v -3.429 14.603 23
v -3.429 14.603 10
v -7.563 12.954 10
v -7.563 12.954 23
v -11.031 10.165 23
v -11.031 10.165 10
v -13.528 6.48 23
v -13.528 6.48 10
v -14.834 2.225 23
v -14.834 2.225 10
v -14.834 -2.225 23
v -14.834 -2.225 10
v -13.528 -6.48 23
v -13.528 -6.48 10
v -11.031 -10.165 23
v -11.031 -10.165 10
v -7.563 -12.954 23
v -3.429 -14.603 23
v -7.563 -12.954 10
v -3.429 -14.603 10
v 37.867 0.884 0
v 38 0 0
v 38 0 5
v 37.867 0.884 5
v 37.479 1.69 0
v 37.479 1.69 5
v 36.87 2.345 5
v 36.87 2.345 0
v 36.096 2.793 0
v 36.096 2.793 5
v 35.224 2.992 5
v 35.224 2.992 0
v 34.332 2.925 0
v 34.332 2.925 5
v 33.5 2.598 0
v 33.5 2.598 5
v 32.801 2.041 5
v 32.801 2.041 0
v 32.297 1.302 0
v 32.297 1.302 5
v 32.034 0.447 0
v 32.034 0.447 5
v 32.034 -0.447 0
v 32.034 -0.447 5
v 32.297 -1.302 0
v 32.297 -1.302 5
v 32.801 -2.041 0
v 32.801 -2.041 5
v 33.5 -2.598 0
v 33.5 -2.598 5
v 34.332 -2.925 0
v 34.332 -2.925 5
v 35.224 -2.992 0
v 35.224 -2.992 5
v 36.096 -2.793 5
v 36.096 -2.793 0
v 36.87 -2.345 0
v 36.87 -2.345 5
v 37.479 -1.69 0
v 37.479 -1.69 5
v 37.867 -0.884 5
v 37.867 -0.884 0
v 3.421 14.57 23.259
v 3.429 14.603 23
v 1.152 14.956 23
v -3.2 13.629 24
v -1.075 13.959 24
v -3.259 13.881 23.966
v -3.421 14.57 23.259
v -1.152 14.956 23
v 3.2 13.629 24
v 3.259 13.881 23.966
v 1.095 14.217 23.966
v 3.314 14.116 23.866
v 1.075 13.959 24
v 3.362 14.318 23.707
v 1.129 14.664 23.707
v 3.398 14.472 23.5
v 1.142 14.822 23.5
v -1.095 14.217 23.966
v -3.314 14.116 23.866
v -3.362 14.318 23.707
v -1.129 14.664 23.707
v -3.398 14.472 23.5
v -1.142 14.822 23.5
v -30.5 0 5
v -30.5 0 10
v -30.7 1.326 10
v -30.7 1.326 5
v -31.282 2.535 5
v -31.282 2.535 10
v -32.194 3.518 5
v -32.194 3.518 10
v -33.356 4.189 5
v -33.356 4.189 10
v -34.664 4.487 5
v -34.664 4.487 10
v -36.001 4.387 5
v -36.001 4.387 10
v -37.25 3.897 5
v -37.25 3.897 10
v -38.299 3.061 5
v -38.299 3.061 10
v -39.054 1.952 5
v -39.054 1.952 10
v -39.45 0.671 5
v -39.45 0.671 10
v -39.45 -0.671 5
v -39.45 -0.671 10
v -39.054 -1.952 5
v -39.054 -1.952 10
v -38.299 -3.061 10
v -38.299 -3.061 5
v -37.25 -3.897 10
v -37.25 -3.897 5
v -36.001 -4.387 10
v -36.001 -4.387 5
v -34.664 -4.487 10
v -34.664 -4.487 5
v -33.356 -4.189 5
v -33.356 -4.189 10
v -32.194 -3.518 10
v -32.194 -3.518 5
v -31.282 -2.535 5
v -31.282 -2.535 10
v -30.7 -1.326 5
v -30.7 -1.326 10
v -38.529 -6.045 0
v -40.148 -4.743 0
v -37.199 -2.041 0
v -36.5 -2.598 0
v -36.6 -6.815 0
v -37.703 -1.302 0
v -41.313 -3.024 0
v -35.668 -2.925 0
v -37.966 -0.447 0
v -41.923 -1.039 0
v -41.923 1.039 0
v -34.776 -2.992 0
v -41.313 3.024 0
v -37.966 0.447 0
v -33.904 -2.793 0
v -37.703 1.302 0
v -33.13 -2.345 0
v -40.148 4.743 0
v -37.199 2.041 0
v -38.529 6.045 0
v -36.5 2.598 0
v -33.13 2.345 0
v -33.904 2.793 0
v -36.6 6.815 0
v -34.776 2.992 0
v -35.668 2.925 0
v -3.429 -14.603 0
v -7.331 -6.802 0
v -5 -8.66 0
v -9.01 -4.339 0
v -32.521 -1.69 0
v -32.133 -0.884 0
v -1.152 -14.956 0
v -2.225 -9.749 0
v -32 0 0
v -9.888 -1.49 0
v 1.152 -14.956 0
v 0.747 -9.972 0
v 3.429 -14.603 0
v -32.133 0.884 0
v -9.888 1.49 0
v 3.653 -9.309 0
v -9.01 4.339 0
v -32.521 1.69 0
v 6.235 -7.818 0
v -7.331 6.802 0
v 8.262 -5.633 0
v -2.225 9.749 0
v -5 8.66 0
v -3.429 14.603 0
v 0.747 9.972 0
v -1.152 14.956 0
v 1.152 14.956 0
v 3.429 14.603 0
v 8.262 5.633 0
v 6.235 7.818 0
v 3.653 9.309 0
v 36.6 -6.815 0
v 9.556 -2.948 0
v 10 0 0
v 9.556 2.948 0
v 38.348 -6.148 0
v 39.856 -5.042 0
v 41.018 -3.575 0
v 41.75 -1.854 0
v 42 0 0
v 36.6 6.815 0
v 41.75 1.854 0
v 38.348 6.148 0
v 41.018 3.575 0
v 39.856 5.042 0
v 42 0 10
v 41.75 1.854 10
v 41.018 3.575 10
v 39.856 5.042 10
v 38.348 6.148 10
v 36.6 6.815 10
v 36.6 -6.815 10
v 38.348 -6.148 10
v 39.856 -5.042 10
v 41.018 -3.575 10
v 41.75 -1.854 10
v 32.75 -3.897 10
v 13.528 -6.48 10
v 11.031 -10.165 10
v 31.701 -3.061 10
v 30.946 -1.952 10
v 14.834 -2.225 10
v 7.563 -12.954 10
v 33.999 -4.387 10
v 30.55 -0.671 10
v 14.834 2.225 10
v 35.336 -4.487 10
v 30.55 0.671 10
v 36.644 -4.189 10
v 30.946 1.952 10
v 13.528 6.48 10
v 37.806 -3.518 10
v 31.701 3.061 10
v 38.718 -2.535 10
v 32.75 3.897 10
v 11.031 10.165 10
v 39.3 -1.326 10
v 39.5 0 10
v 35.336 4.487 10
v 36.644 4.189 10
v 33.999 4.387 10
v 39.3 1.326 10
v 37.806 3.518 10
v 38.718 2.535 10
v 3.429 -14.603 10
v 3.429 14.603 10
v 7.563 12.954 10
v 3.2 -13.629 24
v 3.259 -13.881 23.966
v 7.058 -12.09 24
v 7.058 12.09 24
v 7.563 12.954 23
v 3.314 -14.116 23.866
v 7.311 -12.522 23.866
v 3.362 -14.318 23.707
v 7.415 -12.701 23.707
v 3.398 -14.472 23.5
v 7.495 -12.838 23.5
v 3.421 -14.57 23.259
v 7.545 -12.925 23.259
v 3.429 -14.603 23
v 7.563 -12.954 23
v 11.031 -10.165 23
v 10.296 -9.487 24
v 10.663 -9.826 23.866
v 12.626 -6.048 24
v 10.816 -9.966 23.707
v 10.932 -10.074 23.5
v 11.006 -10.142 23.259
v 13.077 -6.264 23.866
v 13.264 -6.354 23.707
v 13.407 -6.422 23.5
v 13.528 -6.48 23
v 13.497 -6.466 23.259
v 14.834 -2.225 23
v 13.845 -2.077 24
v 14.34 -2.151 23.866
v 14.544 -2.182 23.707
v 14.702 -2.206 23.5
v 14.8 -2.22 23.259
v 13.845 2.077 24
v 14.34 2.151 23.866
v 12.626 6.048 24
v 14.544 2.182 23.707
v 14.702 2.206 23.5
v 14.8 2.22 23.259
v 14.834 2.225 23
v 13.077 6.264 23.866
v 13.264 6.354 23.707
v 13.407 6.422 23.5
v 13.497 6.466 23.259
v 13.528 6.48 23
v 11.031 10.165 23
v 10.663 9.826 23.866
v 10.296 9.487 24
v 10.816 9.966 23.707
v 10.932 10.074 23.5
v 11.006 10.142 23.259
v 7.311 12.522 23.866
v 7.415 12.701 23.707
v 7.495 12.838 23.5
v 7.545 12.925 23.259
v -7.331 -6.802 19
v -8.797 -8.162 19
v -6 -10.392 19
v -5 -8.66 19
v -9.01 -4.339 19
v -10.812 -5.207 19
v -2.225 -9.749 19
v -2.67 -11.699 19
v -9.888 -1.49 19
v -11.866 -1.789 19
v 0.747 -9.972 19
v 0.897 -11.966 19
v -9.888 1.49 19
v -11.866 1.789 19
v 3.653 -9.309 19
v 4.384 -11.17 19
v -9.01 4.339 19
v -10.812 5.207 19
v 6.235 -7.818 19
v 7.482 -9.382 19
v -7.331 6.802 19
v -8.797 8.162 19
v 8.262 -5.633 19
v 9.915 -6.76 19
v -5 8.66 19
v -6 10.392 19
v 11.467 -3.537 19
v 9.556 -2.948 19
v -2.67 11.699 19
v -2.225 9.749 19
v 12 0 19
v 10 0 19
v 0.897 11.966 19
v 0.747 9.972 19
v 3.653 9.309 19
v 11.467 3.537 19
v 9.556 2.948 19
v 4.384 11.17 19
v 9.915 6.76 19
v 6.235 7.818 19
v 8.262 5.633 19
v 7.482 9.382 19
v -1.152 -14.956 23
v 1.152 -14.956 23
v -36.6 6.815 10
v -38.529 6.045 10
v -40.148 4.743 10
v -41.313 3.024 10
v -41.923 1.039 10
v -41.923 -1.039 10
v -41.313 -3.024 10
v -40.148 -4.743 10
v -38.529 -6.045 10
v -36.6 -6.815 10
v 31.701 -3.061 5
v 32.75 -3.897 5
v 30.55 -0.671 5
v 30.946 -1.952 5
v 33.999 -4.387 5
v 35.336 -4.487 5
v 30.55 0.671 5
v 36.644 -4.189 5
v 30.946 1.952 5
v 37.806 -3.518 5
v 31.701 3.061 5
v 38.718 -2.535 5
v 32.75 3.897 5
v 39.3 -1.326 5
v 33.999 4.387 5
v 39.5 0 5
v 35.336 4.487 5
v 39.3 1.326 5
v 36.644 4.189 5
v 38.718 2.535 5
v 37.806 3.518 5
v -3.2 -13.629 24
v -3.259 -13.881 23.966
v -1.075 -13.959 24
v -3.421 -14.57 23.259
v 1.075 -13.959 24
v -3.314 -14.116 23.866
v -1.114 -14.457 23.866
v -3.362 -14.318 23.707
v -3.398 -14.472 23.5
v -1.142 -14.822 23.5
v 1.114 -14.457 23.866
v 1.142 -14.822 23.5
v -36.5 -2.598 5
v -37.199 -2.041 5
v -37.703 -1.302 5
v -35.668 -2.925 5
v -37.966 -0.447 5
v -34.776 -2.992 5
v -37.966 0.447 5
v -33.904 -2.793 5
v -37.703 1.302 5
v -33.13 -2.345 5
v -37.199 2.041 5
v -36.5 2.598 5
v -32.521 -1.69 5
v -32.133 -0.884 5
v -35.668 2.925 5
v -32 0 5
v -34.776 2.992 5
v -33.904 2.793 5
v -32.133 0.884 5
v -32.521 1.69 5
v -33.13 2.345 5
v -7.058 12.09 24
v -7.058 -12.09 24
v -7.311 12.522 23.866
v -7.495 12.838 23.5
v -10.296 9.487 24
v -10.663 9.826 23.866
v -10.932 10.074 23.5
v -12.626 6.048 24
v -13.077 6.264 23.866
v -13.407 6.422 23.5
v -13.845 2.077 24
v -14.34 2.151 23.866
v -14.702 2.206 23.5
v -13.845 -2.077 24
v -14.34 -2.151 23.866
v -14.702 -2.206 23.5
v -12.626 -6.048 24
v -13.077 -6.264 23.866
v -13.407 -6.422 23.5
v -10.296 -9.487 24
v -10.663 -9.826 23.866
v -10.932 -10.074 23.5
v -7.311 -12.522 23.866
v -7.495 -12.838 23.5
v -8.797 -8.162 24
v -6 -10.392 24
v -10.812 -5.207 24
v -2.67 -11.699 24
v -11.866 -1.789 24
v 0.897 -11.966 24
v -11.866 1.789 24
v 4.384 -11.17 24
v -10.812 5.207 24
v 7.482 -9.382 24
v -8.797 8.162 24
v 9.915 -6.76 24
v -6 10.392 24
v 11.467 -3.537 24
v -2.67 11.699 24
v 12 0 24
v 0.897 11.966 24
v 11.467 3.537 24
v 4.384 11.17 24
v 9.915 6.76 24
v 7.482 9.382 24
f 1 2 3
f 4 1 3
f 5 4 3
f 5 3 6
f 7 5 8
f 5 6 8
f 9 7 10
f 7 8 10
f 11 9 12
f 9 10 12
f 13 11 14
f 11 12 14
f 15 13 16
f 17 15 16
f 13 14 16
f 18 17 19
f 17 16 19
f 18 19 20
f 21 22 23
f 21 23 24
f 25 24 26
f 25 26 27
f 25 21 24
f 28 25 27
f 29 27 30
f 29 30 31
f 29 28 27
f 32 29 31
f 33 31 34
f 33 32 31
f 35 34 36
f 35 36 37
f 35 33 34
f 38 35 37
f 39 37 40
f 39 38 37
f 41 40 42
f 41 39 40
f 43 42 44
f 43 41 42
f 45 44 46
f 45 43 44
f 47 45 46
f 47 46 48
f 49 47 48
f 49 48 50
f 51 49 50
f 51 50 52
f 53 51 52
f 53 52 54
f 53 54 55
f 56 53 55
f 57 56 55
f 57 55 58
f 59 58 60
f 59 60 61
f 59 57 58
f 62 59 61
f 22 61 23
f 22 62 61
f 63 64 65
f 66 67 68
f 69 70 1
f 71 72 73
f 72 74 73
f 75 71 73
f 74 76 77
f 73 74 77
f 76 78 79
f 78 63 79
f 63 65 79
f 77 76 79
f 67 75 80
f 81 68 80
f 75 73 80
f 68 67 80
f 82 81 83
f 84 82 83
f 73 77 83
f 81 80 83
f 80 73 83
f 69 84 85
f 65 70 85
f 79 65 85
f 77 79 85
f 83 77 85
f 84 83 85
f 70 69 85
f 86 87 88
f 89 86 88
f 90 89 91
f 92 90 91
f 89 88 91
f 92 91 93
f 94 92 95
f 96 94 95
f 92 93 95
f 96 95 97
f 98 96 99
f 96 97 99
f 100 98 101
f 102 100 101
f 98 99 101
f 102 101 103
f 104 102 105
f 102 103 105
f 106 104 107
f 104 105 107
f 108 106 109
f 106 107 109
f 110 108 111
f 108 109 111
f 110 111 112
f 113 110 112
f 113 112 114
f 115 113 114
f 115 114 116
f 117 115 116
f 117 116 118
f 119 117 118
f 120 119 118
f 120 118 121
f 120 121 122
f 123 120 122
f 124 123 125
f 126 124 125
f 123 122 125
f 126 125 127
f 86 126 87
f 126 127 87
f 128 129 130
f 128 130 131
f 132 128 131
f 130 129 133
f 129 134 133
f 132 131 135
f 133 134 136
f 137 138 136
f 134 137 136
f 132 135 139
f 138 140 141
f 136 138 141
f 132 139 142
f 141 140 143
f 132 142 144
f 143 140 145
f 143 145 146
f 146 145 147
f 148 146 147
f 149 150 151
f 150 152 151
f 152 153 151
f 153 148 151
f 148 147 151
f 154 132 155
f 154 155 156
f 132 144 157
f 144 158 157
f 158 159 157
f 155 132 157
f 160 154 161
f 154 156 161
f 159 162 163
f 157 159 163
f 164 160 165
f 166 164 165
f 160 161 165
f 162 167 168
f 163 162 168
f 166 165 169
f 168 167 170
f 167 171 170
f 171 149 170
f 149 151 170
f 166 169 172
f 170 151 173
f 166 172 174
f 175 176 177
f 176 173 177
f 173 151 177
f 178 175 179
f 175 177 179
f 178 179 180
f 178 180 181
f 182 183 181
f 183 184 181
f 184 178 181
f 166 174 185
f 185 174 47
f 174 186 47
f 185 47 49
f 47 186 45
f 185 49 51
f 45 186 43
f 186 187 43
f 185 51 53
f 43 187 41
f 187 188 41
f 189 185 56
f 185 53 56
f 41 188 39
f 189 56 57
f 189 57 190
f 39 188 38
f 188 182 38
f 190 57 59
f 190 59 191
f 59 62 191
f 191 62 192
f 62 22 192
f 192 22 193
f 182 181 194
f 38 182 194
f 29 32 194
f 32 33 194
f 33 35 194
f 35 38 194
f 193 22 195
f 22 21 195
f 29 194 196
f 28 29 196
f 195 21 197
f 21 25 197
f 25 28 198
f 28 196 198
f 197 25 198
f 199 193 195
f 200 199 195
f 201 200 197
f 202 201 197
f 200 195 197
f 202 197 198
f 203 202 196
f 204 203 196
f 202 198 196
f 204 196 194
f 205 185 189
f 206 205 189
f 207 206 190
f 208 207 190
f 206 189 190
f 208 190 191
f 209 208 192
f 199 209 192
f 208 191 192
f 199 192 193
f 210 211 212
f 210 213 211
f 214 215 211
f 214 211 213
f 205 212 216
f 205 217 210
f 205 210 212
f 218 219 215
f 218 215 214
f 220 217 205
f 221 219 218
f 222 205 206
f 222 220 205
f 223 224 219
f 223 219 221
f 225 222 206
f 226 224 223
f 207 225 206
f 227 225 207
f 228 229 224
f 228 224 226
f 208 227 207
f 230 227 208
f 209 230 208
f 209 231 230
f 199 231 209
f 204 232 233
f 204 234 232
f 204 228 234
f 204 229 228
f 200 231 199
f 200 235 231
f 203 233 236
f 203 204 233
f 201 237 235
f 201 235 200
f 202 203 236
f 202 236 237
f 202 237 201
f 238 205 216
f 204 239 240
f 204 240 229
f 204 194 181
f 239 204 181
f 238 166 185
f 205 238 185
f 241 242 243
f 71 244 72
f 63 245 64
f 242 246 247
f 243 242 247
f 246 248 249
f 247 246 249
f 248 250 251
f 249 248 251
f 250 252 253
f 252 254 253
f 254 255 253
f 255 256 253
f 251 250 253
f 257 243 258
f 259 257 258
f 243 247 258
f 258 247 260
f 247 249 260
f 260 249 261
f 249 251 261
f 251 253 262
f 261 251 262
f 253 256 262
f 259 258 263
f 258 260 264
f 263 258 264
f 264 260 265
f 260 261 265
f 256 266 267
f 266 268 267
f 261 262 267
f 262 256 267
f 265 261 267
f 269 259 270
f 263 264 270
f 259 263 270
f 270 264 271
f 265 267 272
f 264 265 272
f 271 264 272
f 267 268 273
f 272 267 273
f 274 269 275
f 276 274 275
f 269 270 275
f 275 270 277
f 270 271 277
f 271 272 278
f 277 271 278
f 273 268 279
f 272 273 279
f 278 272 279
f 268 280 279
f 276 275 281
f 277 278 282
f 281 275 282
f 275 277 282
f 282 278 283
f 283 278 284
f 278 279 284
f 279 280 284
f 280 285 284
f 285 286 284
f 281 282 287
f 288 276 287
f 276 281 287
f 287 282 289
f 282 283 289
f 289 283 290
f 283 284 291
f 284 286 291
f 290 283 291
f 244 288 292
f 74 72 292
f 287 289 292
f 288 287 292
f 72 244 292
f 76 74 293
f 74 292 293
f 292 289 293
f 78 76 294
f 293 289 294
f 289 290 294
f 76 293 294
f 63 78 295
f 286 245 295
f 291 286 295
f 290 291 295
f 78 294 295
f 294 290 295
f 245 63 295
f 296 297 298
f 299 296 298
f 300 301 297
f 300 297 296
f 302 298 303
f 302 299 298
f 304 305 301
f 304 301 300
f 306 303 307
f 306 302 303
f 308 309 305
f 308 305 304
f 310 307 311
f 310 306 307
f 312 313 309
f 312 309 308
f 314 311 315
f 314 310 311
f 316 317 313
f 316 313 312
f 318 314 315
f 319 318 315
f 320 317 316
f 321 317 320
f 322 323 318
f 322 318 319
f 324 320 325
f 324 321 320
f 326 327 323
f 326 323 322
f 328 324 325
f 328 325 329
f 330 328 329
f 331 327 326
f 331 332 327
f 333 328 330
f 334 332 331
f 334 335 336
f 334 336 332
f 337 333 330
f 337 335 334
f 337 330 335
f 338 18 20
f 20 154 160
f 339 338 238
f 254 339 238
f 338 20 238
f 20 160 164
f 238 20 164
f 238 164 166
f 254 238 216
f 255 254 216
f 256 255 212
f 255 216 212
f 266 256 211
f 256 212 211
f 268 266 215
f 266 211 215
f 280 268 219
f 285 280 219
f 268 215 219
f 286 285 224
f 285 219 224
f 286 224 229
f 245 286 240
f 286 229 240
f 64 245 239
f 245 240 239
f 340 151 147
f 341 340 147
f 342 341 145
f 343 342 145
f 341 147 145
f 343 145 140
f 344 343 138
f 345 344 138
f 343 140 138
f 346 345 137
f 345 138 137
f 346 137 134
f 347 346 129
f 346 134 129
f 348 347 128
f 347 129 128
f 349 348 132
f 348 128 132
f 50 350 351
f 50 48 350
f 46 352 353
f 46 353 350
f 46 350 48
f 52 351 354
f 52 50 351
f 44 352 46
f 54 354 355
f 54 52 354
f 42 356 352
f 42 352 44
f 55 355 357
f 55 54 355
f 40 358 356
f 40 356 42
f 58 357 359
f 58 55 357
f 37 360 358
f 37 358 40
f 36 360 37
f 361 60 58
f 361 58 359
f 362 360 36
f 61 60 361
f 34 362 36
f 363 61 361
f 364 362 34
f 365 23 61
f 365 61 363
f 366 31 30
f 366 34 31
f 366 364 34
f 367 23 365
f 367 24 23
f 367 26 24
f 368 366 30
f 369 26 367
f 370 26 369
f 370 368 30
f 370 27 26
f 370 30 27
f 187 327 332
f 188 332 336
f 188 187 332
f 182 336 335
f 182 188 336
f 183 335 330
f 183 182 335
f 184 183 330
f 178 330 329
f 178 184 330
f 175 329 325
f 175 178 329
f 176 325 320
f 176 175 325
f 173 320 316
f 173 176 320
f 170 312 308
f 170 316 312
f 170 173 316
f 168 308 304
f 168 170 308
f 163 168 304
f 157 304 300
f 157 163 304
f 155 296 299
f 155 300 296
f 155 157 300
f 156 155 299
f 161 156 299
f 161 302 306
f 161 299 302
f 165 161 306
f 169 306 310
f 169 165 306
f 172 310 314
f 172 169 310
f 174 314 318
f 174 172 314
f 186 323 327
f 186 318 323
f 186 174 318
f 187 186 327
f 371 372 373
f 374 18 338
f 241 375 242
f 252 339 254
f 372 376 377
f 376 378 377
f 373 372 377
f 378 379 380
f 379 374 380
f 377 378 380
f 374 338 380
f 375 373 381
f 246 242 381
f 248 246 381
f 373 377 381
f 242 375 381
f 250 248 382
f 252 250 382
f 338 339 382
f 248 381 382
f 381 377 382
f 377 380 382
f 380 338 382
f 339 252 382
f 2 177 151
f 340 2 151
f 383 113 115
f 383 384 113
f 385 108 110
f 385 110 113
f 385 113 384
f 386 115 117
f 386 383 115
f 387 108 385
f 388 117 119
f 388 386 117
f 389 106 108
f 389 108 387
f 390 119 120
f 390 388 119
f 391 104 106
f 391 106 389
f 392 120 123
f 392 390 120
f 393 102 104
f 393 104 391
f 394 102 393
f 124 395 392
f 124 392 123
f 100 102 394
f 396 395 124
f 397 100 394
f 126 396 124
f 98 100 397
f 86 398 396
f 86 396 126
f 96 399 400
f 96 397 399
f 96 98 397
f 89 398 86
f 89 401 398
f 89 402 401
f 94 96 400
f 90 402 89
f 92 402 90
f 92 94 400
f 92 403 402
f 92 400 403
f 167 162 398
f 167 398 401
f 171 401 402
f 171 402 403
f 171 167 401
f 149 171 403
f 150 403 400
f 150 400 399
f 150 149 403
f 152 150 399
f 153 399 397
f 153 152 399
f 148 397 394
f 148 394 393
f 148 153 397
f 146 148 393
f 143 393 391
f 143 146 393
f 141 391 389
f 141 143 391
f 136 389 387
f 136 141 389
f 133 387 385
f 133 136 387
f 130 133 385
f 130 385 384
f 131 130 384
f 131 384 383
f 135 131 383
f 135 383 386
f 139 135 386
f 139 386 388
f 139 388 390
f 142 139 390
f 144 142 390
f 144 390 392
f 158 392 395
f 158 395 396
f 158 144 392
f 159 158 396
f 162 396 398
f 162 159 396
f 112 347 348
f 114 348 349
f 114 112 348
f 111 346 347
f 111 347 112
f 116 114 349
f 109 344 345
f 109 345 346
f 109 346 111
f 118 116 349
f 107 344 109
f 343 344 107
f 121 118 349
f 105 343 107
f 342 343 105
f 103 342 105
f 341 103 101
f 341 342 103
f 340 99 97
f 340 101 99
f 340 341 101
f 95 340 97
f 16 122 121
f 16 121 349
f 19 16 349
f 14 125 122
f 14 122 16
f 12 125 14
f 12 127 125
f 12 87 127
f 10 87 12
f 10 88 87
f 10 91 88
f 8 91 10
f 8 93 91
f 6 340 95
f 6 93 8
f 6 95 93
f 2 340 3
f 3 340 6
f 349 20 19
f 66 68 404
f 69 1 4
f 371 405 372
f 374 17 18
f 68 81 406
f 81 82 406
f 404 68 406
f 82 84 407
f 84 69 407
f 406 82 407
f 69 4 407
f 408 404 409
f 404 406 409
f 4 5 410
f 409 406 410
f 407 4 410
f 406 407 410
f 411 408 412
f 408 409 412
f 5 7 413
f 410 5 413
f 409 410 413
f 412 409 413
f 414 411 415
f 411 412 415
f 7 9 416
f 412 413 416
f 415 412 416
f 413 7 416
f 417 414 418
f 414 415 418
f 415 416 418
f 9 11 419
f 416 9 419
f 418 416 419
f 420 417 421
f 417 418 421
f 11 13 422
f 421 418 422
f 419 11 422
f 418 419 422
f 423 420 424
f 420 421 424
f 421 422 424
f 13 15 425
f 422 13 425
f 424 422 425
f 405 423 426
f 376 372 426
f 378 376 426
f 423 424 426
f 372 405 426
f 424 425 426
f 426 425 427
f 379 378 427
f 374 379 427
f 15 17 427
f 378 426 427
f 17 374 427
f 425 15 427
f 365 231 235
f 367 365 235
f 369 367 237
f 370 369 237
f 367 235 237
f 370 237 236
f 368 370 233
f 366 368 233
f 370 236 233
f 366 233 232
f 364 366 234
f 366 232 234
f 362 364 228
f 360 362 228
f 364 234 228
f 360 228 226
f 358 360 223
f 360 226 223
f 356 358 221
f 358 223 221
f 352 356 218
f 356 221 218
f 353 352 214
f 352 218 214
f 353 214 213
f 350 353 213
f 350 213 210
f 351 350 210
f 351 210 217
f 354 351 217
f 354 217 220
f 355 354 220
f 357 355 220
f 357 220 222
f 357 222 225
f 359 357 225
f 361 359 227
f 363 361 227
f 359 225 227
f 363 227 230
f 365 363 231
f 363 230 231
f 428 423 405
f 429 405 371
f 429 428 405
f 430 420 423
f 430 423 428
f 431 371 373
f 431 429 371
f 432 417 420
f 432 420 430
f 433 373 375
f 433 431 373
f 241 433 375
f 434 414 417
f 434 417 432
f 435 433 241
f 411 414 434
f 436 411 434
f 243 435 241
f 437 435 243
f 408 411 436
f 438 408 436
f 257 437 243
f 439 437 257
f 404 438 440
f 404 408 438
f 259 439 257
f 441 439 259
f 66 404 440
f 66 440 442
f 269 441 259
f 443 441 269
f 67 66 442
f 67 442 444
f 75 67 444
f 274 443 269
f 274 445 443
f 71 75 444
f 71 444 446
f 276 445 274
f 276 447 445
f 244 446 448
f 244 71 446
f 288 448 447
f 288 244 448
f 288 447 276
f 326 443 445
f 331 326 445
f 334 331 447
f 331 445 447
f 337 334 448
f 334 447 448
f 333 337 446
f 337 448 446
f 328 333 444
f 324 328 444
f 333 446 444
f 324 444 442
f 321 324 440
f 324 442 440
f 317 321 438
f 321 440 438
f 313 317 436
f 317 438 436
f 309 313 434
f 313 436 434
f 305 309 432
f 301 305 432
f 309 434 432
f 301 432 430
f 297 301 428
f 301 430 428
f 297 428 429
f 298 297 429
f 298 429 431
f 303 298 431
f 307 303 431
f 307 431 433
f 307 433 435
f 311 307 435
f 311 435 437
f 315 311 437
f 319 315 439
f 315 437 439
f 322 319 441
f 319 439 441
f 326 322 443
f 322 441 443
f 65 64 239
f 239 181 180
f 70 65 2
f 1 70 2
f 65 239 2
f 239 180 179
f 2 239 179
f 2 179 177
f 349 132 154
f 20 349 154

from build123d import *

# Parameters (mm, degrees)
F0_R     = 10
F1_DEPTH = 10
F2_R     = 15
F2_R_2   = 10
F3_DEPTH = 14
F4_R     = 3
F5_DEPTH = 5
F6_R     = 4.5
F7_DEPTH = 5
F8_R     = 12
F9_DEPTH = 5
F10_R    = 1


with BuildPart() as f1:
    # F0 (on Top) → F1 (new body)
    with BuildSketch(Plane.XY):
        with BuildLine():
            ThreePointArc((42, 0), (40.486347, 4.347413), (36.6, 6.81469))
            ThreePointArc((36.6, 6.81469), (28, 0), (36.6, -6.81469))
            ThreePointArc((36.6, -6.81469), (40.486347, -4.347413), (42, 0))
        make_face()
        with BuildLine():
            ThreePointArc((-28, 0), (-30.652587, 5.486347), (-36.6, 6.81469))
            ThreePointArc((-36.6, 6.81469), (-42, 0), (-36.6, -6.81469))
            ThreePointArc((-36.6, -6.81469), (-30.652587, -5.486347), (-28, 0))
        make_face()
        with BuildLine():
            ThreePointArc((3.428571, 14.602907), (11.756457, 9.315885), (15, 0))
            ThreePointArc((15, 0), (11.756457, -9.315885), (3.428571, -14.602907))
            Line((3.428571, -14.602907), (36.6, -6.81469))
            ThreePointArc((36.6, -6.81469), (28, 0), (36.6, 6.81469))
            Line((36.6, 6.81469), (3.428571, 14.602907))
        make_face()
        with BuildLine():
            ThreePointArc((3.428571, -14.602907), (11.756457, -9.315885), (15, 0))
            ThreePointArc((15, 0), (11.756457, 9.315885), (3.428571, 14.602907))
            ThreePointArc((3.428571, 14.602907), (0, 15), (-3.428571, 14.602907))
            ThreePointArc((-3.428571, 14.602907), (-15, 0), (-3.428571, -14.602907))
            ThreePointArc((-3.428571, -14.602907), (0, -15), (3.428571, -14.602907))
        make_face()
        Circle(F0_R, mode=Mode.SUBTRACT)
        with BuildLine():
            ThreePointArc((-3.428571, -14.602907), (-15, 0), (-3.428571, 14.602907))
            Line((-3.428571, 14.602907), (-36.6, 6.81469))
            ThreePointArc((-36.6, 6.81469), (-30.652587, 5.486347), (-28, 0))
            ThreePointArc((-28, 0), (-30.652587, -5.486347), (-36.6, -6.81469))
            Line((-36.6, -6.81469), (-3.428571, -14.602907))
        make_face()
    extrude(amount=F1_DEPTH)

    # F2 (on face) → F3 (join)
    with BuildSketch(Plane.XY.offset(10)):
        Circle(F2_R)
        Circle(F2_R_2, mode=Mode.SUBTRACT)
        with BuildLine():
            ThreePointArc((3.428571, -14.602907), (11.756457, -9.315885), (15, 0))
            ThreePointArc((15, 0), (11.756457, 9.315885), (3.428571, 14.602907))
            ThreePointArc((3.428571, 14.602907), (0, 15), (-3.428571, 14.602907))
            ThreePointArc((-3.428571, 14.602907), (-15, 0), (-3.428571, -14.602907))
            ThreePointArc((-3.428571, -14.602907), (0, -15), (3.428571, -14.602907))
        make_face()
        Circle(F2_R_2, mode=Mode.SUBTRACT)
    extrude(amount=F3_DEPTH)

    # F4 (on Top) → F5 (cut)
    with BuildSketch(Plane.XY):
        with Locations((35, 0)):
            Circle(F4_R)
        with Locations((-35, 0)):
            Circle(F4_R)
    extrude(amount=F5_DEPTH, mode=Mode.SUBTRACT)

    # F6 (on face) → F7 (cut)
    with BuildSketch(Plane.XY.offset(10)):
        with Locations((35, 0)):
            Circle(F6_R)
        with Locations((-35, 0)):
            Circle(F6_R)
    extrude(amount=-F7_DEPTH, mode=Mode.SUBTRACT)

    # F8 (on face) → F9 (cut)
    with BuildSketch(Plane.XY.offset(24)):
        Circle(F8_R)
    extrude(amount=-F9_DEPTH, mode=Mode.SUBTRACT)

    # F10
    f10_edges = [f1.edges().sort_by_distance(p)[0] for p in [
        (-15, 0, 24),
    ]]
    fillet(f10_edges, radius=F10_R)


solid = f1.part
